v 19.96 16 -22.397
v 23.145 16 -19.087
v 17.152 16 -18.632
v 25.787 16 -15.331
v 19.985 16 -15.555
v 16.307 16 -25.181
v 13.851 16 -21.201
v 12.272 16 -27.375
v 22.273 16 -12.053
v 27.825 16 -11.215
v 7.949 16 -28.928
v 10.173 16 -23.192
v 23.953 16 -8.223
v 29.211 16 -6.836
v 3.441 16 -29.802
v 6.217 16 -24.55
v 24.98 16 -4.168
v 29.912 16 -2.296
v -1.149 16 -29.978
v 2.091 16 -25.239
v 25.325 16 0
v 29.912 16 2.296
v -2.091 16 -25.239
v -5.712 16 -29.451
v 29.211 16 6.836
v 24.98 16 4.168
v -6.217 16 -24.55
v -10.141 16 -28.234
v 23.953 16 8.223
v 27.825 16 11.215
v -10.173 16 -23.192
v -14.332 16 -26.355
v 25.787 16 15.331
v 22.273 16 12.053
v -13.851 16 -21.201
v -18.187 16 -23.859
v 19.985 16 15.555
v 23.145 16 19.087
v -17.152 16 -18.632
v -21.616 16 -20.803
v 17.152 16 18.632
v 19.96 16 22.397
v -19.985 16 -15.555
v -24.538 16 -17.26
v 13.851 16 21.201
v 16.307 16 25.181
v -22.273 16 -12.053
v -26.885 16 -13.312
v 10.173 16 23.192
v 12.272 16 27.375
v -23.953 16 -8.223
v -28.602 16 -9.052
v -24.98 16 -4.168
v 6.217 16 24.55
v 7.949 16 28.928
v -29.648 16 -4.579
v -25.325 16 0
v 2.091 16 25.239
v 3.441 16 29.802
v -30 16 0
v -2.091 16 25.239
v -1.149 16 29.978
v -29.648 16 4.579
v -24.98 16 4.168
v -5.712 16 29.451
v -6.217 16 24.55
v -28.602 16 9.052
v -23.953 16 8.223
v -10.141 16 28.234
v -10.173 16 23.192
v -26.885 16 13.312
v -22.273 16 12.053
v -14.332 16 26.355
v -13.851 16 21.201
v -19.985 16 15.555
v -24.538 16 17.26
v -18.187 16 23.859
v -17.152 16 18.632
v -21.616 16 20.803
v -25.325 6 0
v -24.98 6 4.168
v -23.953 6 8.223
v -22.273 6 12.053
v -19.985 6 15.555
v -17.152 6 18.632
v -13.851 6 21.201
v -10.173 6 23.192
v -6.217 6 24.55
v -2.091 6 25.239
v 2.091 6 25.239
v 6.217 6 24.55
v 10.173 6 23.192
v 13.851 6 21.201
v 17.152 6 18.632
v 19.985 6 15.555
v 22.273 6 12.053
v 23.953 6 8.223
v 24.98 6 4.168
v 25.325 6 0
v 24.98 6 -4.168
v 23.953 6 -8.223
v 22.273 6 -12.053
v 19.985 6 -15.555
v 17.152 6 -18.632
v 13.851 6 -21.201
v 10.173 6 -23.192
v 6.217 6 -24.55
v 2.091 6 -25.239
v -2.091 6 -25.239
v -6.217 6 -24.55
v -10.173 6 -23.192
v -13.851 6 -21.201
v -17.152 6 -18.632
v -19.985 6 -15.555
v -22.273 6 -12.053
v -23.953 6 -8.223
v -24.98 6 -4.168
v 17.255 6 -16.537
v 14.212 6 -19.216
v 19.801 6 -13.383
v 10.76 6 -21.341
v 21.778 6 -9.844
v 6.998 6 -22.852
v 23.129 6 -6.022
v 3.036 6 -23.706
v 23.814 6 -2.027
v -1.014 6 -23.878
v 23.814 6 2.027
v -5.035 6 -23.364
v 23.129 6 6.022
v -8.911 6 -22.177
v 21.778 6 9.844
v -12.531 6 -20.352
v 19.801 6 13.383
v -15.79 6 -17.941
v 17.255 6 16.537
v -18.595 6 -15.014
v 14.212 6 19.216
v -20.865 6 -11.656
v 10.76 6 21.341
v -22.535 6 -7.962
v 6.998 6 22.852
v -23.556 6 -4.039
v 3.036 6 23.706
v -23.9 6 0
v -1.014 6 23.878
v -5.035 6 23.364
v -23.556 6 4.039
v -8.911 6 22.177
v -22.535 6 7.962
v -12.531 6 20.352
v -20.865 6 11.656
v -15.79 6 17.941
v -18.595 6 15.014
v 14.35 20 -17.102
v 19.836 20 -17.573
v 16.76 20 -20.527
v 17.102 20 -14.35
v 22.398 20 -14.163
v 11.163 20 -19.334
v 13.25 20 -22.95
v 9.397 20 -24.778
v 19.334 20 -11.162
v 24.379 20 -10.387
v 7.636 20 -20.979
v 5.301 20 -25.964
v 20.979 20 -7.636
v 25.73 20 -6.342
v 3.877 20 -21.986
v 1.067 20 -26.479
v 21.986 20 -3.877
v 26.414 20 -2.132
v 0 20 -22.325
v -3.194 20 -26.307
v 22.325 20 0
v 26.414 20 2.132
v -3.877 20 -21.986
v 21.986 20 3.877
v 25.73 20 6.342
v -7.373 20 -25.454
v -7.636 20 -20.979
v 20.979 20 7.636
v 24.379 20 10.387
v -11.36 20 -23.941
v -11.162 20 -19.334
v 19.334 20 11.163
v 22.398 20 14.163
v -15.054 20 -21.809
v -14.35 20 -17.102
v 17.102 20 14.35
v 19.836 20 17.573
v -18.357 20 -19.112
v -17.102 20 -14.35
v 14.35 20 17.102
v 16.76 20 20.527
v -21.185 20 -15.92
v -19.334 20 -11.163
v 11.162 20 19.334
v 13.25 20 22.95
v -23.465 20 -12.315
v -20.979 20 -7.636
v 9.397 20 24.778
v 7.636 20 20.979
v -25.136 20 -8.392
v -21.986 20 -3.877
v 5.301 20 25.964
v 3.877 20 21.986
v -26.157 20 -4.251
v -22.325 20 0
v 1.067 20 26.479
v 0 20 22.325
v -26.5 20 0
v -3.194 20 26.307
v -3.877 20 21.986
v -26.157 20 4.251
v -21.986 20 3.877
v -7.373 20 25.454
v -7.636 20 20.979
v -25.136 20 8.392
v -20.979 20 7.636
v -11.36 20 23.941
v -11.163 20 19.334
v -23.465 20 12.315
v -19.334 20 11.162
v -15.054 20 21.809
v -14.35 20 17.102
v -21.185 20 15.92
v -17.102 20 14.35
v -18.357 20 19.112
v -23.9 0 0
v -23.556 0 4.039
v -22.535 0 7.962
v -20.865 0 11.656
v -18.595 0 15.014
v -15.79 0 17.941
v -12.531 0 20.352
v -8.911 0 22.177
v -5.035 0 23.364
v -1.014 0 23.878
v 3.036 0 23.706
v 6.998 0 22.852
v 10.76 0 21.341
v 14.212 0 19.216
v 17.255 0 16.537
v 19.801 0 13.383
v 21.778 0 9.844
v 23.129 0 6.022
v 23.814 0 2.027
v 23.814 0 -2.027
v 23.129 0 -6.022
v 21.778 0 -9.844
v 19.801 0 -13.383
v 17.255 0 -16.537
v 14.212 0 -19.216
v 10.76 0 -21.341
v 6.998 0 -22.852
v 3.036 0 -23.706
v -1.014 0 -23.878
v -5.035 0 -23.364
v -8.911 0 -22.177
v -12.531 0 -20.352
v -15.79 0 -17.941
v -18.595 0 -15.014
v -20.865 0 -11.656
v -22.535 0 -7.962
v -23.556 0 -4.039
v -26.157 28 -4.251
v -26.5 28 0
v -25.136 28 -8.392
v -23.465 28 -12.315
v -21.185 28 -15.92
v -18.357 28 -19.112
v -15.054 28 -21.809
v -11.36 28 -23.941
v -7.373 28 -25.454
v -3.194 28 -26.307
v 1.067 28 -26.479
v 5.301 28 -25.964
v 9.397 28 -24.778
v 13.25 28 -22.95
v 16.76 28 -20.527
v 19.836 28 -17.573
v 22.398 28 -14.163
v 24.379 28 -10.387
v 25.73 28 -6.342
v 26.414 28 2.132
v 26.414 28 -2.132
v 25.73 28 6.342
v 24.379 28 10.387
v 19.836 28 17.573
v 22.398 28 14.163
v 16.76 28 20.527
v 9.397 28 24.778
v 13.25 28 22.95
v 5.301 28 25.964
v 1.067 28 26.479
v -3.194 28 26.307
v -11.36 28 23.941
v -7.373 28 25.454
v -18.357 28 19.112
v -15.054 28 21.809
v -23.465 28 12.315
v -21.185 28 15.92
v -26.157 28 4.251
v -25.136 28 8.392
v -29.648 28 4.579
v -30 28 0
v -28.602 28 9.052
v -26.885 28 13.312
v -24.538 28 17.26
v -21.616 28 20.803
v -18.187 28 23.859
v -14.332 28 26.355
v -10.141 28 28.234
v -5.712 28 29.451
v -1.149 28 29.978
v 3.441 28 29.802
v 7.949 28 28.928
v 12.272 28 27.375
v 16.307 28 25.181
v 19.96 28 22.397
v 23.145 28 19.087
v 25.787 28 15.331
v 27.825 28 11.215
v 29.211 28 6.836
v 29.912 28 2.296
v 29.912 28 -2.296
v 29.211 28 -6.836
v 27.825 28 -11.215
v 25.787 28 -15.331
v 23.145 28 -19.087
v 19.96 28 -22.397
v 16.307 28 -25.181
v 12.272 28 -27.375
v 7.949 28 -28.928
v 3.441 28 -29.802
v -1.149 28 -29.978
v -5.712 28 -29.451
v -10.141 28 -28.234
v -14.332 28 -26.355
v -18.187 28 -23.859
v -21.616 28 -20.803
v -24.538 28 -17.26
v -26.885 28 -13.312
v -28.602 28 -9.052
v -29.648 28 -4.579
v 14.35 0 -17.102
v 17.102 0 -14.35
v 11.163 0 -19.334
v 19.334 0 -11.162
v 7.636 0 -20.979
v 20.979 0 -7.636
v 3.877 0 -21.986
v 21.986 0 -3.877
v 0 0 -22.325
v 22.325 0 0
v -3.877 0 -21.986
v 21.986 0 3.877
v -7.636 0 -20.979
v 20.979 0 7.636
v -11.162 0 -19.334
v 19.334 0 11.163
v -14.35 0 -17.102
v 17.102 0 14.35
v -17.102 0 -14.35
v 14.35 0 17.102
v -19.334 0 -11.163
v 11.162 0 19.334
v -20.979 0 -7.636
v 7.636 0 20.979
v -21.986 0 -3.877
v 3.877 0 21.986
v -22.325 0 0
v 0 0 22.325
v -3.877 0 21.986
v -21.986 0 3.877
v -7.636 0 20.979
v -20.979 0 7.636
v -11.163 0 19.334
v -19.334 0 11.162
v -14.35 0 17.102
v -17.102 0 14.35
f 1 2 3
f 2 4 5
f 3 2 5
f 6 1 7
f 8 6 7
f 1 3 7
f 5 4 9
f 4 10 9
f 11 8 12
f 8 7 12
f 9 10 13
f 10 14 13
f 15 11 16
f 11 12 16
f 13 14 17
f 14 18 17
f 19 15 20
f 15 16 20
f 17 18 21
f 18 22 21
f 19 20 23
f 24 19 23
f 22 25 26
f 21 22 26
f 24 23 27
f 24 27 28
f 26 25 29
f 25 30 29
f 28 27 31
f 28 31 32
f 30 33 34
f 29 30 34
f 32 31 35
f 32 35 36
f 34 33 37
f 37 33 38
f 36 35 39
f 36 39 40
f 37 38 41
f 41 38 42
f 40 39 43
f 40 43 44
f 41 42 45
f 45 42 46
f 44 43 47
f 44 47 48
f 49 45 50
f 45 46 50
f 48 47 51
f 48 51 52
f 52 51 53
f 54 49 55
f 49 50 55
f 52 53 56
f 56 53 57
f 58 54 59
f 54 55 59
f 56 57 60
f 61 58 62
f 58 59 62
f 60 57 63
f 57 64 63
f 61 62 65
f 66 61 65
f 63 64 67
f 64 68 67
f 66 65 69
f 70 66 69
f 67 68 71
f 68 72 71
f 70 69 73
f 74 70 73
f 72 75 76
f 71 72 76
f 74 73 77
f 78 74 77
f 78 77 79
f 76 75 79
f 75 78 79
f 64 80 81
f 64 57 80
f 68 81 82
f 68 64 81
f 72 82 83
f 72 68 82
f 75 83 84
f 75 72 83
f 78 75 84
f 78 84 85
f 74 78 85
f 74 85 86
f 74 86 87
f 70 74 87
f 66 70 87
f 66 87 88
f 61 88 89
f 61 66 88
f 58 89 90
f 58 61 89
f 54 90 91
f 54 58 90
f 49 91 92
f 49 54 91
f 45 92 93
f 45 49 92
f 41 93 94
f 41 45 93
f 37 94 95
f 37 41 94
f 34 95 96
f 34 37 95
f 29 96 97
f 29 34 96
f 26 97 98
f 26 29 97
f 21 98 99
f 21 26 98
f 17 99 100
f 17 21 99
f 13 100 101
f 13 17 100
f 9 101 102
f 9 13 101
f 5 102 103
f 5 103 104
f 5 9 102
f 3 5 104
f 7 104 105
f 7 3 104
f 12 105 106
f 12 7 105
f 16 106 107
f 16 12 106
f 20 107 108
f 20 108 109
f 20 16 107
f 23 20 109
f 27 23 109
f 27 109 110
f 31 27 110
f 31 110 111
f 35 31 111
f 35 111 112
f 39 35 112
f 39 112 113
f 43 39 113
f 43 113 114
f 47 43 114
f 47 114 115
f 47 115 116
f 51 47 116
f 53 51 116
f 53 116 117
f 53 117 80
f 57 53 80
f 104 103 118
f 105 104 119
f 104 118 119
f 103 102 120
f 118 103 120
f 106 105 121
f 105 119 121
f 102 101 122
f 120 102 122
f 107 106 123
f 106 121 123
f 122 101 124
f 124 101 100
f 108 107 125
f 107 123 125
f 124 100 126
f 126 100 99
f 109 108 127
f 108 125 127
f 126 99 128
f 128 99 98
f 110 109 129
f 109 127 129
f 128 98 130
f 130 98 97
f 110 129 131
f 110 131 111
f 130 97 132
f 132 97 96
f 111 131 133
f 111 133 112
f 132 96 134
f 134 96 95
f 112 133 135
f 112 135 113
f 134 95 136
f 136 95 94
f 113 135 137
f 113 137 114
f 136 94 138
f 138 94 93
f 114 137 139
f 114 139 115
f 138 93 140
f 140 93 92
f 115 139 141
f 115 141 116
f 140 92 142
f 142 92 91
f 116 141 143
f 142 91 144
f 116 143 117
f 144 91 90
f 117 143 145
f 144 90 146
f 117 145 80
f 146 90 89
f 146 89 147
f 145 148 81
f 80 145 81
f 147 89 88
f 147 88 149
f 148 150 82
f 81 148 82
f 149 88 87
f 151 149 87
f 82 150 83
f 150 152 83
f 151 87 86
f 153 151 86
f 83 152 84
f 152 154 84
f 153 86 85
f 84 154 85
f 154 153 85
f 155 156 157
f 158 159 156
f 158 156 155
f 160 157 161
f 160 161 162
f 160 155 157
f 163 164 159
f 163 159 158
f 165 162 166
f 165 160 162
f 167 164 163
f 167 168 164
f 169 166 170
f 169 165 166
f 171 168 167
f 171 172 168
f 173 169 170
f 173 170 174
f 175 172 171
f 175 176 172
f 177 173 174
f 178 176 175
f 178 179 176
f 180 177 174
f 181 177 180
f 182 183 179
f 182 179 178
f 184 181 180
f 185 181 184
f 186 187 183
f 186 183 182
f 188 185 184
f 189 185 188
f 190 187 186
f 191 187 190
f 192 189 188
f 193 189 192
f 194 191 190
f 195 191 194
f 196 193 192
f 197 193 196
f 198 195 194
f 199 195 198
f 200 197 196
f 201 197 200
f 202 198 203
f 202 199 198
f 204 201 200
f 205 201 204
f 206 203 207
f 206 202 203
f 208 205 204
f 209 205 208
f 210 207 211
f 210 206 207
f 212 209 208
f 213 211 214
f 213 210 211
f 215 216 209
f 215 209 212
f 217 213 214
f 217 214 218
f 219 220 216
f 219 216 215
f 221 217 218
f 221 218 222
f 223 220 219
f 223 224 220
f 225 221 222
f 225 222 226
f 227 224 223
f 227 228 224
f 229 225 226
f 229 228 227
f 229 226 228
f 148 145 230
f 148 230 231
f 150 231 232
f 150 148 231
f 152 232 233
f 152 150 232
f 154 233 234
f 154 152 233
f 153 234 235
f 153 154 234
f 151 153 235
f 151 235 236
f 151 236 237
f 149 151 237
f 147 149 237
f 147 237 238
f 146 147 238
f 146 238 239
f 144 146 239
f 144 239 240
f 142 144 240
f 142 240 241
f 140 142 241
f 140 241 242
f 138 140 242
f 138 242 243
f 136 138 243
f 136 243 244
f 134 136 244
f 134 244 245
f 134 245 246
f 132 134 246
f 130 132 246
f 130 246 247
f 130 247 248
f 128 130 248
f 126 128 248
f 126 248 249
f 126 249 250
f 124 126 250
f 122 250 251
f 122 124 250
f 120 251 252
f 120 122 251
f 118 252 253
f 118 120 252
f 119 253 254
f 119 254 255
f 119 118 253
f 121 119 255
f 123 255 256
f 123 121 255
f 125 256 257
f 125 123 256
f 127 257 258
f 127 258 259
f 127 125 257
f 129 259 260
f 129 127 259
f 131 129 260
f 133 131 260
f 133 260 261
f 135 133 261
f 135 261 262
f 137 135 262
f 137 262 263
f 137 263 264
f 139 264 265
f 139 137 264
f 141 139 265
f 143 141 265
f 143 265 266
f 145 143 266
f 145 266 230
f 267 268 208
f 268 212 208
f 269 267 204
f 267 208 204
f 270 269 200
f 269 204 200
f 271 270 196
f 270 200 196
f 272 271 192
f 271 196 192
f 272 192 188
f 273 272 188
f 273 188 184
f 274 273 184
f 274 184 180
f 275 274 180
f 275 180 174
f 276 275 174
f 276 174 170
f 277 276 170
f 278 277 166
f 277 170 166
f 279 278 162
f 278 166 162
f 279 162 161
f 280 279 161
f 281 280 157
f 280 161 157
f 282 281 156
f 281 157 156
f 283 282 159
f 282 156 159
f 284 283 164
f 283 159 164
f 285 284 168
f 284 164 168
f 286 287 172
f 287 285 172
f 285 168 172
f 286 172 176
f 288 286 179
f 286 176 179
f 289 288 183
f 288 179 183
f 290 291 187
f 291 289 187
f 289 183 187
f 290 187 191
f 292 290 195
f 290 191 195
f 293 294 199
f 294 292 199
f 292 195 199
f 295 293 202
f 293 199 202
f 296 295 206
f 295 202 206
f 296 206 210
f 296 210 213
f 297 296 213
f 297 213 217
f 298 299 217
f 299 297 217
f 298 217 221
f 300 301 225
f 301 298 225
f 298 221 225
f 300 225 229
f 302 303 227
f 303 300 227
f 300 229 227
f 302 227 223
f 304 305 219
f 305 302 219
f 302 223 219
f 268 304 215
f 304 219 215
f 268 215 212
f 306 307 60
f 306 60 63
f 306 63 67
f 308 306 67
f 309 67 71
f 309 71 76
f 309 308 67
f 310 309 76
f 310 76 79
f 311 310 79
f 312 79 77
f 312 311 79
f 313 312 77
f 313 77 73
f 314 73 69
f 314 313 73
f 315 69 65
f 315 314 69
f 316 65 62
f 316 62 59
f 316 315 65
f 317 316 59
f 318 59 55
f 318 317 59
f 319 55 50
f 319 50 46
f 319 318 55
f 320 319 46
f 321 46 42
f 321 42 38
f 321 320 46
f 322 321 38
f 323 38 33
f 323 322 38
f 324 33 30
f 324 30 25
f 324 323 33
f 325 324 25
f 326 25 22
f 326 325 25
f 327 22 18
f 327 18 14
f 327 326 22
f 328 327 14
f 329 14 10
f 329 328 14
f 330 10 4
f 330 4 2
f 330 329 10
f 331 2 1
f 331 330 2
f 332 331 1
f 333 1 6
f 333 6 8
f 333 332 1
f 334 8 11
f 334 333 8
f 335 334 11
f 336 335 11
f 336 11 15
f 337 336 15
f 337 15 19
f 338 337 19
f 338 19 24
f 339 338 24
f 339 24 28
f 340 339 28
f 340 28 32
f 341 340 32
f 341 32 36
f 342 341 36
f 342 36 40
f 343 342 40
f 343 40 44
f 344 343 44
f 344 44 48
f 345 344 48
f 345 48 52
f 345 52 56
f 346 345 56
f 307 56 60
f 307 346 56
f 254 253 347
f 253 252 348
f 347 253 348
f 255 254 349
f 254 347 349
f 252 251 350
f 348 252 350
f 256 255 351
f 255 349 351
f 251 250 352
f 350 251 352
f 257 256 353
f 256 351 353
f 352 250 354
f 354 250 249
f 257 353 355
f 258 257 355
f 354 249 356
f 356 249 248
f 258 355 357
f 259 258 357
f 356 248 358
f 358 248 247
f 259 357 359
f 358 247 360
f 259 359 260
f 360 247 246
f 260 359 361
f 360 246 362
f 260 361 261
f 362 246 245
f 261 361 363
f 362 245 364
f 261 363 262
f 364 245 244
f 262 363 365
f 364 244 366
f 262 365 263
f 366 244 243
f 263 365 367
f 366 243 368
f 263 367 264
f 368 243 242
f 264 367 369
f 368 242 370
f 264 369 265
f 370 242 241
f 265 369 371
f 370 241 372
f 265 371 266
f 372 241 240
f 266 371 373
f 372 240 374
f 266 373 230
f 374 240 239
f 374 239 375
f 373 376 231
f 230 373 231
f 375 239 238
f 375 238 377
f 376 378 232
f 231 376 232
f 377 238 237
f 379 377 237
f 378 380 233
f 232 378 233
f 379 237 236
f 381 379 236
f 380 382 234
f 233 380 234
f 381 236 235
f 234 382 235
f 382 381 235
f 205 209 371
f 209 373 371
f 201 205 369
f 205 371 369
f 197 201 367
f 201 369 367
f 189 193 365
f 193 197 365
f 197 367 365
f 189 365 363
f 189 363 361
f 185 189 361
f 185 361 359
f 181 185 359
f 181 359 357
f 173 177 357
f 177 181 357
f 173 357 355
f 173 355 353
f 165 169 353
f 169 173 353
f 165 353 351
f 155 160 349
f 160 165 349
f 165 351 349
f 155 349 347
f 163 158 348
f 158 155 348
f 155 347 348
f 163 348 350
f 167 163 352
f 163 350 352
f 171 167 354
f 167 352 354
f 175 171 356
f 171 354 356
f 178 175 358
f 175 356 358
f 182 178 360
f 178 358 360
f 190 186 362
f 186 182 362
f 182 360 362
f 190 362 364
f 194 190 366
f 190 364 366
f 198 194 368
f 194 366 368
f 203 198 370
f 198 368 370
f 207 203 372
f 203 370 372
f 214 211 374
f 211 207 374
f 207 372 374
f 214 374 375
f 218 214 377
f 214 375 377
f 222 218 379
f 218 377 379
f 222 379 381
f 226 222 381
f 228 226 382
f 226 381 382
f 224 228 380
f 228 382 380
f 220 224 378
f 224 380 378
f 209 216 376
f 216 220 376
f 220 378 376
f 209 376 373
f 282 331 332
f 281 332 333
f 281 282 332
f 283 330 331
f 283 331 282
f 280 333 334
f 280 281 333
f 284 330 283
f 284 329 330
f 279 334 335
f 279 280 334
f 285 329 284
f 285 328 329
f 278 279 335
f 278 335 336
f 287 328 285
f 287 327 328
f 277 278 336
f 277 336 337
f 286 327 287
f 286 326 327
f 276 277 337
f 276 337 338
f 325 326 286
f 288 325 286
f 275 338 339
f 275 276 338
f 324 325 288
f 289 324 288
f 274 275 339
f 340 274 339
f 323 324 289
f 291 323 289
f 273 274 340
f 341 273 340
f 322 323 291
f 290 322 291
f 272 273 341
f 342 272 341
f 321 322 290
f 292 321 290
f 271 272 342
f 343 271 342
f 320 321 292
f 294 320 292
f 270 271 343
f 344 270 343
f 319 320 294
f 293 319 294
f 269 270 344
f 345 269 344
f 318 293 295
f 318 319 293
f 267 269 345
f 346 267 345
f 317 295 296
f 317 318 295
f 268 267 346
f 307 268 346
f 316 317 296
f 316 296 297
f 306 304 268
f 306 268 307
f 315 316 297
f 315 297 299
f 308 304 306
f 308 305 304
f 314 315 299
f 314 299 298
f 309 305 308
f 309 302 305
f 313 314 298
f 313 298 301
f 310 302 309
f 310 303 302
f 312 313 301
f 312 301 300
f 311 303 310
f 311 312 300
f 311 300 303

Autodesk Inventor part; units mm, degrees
ref_plane "YZ Plane" through (0, 0, 0) normal (1, 0, 0) x (0, 1, 0)
ref_plane "XZ Plane" through (0, 0, 0) normal (0, 1, 0) x (-1, 0, 0)
ref_plane "XY Plane" through (0, 0, 0) normal (0, 0, 1) x (1, 0, 0)
sketch "Sketch1" plane through (0, 0, 0) normal (0, 0, 1) x (1, 0, 0)
  line L0 (-22.325, 20) -> (-22.325, 0)
  line L1 (-22.325, 0) -> (-23.9, 0)
  line L2 (-23.9, 0) -> (-23.9, 6)
  line L3 (-23.9, 6) -> (-25.325, 6)
  line L4 (-25.325, 6) -> (-25.325, 16)
  line L5 (-25.325, 16) -> (-30, 16)
  line L6 (-30, 16) -> (-30, 28)
  line L7 (-30, 28) -> (-26.5, 28)
  line L8 (-26.5, 28) -> (-26.5, 20)
  line L9 (-26.5, 20) -> (-22.325, 20)
  line L10 (0, -5.6) -> (0, 33.6) projected
  point P0 (0, 0)
  dimension "d0" = 23.9
  dimension "neck_ir" = 22.325
  dimension "d4" = 8
  dimension "d5" = 6
  dimension "d6" = 3
  dimension "d7" = 10
  dimension "neck_thread_dia" = 30
  dimension "neck_thread_len" = 12
  dimension "d14" = 26.5
revolve "Revolution1" add sketch "Sketch1" angle 360 about axis through (0, -10, 0) along (0, 1, 0)
thread "Thread1" size "M60x1" class "6g" standard "ANSI Metric M Profile" full length
equation "\"d4\" = 2 * oring_dia"
equation "\"d14\" = 0.5 * oring_od"
equation "\"oring_diameter\" = 4"
equation "\"oring_dia\" = 4"
equation "\"oring_od\" = 53"
properties part number "neck" material "Brass"
